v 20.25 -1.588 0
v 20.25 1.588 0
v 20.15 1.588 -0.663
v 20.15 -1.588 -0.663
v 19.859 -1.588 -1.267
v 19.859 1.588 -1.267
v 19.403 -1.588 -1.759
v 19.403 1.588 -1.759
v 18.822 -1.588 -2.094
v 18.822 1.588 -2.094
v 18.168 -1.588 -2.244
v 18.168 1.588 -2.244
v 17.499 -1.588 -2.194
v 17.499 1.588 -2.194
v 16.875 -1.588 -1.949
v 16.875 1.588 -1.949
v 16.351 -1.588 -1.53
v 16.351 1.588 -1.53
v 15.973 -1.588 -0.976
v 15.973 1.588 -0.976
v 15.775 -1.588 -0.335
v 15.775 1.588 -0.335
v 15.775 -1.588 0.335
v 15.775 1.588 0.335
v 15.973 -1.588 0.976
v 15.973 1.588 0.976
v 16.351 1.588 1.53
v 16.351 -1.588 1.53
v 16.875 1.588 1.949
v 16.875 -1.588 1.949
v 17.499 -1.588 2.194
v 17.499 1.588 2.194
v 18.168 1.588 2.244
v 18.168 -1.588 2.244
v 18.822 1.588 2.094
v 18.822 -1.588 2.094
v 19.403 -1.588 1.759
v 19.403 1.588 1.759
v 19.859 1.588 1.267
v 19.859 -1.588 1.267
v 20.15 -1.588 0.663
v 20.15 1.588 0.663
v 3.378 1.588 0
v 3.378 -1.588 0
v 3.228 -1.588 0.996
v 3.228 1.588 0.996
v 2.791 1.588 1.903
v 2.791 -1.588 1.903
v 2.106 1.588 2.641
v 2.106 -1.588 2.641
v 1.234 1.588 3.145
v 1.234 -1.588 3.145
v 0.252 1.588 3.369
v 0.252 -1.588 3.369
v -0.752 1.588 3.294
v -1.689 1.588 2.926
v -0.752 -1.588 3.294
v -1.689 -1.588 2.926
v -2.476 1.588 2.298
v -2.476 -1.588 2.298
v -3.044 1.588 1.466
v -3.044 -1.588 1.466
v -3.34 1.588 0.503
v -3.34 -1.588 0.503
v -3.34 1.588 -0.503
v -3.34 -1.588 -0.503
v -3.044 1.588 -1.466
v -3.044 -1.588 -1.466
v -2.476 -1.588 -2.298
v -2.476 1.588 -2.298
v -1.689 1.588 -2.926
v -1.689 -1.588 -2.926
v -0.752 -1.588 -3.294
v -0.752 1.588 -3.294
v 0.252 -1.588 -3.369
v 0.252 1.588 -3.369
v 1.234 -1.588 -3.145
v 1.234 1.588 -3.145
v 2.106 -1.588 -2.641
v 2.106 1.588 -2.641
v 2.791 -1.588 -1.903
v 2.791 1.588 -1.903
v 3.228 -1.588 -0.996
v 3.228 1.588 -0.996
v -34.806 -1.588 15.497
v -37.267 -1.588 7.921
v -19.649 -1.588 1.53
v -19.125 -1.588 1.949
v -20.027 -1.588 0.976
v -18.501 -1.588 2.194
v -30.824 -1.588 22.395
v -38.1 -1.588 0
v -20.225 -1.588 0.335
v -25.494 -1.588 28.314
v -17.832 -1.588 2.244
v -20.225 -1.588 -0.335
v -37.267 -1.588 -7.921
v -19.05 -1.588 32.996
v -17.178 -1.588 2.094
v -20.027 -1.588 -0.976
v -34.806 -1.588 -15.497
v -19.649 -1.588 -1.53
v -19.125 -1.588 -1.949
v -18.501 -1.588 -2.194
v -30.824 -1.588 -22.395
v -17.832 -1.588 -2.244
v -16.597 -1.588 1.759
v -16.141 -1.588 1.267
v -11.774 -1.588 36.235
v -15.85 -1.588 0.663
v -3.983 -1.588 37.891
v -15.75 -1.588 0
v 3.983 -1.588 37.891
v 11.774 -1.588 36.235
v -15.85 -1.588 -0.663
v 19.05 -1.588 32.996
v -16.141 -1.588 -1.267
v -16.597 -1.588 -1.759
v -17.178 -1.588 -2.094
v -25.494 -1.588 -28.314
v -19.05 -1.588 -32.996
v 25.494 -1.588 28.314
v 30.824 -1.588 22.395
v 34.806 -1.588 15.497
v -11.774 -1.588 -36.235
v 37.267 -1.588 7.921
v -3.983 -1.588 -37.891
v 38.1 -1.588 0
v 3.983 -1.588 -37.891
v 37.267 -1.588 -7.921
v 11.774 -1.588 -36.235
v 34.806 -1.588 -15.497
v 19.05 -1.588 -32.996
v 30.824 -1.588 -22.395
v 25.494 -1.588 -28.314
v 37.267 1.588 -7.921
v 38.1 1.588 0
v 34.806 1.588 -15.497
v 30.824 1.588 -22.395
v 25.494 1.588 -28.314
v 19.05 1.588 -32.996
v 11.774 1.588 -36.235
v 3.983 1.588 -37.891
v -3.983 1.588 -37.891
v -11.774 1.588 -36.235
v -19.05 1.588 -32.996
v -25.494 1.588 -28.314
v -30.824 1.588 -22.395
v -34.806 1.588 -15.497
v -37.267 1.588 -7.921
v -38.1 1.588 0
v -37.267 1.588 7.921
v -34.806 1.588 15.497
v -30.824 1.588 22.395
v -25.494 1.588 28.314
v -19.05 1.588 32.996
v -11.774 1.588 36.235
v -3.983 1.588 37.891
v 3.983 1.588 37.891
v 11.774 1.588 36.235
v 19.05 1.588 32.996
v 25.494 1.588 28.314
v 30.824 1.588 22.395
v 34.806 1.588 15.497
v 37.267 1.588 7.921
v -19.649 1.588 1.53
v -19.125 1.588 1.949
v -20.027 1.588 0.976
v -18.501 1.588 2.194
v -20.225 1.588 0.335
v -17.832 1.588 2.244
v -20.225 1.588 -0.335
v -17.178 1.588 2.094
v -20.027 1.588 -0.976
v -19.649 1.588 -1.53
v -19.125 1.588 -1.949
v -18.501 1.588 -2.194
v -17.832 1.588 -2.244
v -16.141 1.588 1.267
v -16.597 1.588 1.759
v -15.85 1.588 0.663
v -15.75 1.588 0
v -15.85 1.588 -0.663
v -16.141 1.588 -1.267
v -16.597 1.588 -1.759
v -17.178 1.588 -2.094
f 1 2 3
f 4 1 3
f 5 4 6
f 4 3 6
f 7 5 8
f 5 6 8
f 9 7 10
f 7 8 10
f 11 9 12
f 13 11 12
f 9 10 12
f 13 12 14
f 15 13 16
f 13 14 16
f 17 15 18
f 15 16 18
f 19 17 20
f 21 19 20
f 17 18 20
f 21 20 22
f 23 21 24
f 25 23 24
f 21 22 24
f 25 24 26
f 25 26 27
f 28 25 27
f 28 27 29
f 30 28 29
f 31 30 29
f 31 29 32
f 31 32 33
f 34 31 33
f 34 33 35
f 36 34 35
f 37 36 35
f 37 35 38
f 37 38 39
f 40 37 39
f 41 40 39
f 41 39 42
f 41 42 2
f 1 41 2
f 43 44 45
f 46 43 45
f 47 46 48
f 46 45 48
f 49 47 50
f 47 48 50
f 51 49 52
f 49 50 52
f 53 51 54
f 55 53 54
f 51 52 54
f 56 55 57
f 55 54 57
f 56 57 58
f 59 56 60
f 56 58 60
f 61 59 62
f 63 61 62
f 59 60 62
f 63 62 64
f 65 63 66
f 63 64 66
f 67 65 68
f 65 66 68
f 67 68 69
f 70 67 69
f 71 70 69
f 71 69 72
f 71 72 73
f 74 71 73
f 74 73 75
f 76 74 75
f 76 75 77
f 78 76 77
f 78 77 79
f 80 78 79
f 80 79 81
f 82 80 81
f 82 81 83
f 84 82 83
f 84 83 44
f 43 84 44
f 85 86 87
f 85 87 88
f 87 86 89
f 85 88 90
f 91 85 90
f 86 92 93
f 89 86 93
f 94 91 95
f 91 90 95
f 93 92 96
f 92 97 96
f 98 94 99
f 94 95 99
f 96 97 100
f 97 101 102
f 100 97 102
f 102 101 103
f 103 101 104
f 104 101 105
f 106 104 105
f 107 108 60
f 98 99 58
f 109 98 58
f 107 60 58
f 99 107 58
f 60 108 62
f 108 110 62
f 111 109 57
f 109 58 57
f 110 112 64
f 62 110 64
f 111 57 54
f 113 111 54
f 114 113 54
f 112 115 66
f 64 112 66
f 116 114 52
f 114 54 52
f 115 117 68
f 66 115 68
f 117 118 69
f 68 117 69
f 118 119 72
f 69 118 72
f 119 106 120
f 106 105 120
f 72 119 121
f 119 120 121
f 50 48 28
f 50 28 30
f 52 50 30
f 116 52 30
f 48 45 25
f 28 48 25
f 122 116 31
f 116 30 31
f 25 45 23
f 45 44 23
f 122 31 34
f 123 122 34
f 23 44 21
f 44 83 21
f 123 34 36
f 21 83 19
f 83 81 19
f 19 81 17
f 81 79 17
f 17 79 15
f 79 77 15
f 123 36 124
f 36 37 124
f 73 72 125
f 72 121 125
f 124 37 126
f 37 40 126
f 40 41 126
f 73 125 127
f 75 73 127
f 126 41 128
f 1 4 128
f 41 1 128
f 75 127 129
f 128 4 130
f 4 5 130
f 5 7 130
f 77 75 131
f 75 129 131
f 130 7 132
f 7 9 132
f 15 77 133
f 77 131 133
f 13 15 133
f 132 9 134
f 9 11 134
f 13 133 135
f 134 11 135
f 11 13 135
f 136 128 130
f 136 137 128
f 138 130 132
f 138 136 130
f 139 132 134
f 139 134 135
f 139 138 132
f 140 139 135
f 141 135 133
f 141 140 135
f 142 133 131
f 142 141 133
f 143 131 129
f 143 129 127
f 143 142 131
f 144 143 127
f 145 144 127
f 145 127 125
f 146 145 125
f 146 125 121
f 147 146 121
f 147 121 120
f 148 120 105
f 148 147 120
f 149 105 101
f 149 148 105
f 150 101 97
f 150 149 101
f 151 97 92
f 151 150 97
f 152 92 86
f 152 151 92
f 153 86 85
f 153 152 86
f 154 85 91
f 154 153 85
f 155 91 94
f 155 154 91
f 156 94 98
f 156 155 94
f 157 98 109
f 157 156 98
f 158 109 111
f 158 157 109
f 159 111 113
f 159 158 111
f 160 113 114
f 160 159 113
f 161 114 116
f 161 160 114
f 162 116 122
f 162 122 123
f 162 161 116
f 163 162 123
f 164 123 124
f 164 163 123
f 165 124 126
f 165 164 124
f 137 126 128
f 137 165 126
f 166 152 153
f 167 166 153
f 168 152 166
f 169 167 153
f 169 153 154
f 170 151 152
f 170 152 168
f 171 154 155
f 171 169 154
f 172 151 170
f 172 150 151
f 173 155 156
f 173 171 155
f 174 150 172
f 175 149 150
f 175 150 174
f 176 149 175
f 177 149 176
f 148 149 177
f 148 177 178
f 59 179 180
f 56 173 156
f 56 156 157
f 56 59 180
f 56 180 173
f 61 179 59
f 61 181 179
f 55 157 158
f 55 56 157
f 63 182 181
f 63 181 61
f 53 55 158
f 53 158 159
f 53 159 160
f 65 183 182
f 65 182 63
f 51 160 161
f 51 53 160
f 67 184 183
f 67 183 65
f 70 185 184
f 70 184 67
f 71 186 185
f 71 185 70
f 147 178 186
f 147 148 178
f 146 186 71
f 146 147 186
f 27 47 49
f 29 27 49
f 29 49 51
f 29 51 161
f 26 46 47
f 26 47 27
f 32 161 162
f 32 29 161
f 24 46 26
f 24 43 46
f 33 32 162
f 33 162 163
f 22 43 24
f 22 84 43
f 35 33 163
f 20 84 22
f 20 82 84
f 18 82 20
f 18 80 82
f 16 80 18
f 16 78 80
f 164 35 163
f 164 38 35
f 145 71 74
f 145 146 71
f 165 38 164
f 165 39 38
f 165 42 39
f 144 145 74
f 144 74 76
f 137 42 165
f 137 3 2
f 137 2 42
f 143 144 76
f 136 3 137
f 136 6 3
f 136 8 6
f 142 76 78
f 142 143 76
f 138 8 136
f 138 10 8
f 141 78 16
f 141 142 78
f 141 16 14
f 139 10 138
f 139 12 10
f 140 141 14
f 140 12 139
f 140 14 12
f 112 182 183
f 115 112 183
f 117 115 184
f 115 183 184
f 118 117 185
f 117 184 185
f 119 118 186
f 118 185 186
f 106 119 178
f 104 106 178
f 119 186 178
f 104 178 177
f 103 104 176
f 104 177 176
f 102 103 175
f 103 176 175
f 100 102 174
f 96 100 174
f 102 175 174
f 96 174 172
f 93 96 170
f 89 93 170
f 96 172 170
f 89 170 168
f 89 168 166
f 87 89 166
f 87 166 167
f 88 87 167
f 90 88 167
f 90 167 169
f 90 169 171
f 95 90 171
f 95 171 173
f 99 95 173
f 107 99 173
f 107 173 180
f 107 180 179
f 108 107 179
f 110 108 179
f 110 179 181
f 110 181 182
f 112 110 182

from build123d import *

# Parameters (mm, degrees)
SKETCH1_R            = 38.1
BOSS_EXTRUDE1_DEPTH  = 1.5875
M4_CLEARANCE_HOLE1_D = 4.5
SKETCH4_R            = 3.3782
CUT_EXTRUDE1_DEPTH   = 4.175


with BuildPart() as part:
    # Sketch1 → Boss-Extrude1 (new body, symmetric)
    with BuildSketch(Plane(origin=(0, 0, 0), x_dir=(1, 0, 0), z_dir=(0, 1, 0))):
        Circle(SKETCH1_R)
    extrude(amount=BOSS_EXTRUDE1_DEPTH, both=True)

    # M4 Clearance Hole1 (through all)
    with Locations(Plane(origin=(0, -1.5875, 0), x_dir=(-1, 0, 0), z_dir=(0, -1, 0))):
        with Locations((-18, 0), (18, 0)):
            Hole(M4_CLEARANCE_HOLE1_D / 2)

    # Sketch4 → Cut-Extrude1 (cut, through all)
    with BuildSketch(Plane.XZ.offset(1.5875)):
        Circle(SKETCH4_R)
    extrude(amount=-CUT_EXTRUDE1_DEPTH, mode=Mode.SUBTRACT)


solid = part.part
